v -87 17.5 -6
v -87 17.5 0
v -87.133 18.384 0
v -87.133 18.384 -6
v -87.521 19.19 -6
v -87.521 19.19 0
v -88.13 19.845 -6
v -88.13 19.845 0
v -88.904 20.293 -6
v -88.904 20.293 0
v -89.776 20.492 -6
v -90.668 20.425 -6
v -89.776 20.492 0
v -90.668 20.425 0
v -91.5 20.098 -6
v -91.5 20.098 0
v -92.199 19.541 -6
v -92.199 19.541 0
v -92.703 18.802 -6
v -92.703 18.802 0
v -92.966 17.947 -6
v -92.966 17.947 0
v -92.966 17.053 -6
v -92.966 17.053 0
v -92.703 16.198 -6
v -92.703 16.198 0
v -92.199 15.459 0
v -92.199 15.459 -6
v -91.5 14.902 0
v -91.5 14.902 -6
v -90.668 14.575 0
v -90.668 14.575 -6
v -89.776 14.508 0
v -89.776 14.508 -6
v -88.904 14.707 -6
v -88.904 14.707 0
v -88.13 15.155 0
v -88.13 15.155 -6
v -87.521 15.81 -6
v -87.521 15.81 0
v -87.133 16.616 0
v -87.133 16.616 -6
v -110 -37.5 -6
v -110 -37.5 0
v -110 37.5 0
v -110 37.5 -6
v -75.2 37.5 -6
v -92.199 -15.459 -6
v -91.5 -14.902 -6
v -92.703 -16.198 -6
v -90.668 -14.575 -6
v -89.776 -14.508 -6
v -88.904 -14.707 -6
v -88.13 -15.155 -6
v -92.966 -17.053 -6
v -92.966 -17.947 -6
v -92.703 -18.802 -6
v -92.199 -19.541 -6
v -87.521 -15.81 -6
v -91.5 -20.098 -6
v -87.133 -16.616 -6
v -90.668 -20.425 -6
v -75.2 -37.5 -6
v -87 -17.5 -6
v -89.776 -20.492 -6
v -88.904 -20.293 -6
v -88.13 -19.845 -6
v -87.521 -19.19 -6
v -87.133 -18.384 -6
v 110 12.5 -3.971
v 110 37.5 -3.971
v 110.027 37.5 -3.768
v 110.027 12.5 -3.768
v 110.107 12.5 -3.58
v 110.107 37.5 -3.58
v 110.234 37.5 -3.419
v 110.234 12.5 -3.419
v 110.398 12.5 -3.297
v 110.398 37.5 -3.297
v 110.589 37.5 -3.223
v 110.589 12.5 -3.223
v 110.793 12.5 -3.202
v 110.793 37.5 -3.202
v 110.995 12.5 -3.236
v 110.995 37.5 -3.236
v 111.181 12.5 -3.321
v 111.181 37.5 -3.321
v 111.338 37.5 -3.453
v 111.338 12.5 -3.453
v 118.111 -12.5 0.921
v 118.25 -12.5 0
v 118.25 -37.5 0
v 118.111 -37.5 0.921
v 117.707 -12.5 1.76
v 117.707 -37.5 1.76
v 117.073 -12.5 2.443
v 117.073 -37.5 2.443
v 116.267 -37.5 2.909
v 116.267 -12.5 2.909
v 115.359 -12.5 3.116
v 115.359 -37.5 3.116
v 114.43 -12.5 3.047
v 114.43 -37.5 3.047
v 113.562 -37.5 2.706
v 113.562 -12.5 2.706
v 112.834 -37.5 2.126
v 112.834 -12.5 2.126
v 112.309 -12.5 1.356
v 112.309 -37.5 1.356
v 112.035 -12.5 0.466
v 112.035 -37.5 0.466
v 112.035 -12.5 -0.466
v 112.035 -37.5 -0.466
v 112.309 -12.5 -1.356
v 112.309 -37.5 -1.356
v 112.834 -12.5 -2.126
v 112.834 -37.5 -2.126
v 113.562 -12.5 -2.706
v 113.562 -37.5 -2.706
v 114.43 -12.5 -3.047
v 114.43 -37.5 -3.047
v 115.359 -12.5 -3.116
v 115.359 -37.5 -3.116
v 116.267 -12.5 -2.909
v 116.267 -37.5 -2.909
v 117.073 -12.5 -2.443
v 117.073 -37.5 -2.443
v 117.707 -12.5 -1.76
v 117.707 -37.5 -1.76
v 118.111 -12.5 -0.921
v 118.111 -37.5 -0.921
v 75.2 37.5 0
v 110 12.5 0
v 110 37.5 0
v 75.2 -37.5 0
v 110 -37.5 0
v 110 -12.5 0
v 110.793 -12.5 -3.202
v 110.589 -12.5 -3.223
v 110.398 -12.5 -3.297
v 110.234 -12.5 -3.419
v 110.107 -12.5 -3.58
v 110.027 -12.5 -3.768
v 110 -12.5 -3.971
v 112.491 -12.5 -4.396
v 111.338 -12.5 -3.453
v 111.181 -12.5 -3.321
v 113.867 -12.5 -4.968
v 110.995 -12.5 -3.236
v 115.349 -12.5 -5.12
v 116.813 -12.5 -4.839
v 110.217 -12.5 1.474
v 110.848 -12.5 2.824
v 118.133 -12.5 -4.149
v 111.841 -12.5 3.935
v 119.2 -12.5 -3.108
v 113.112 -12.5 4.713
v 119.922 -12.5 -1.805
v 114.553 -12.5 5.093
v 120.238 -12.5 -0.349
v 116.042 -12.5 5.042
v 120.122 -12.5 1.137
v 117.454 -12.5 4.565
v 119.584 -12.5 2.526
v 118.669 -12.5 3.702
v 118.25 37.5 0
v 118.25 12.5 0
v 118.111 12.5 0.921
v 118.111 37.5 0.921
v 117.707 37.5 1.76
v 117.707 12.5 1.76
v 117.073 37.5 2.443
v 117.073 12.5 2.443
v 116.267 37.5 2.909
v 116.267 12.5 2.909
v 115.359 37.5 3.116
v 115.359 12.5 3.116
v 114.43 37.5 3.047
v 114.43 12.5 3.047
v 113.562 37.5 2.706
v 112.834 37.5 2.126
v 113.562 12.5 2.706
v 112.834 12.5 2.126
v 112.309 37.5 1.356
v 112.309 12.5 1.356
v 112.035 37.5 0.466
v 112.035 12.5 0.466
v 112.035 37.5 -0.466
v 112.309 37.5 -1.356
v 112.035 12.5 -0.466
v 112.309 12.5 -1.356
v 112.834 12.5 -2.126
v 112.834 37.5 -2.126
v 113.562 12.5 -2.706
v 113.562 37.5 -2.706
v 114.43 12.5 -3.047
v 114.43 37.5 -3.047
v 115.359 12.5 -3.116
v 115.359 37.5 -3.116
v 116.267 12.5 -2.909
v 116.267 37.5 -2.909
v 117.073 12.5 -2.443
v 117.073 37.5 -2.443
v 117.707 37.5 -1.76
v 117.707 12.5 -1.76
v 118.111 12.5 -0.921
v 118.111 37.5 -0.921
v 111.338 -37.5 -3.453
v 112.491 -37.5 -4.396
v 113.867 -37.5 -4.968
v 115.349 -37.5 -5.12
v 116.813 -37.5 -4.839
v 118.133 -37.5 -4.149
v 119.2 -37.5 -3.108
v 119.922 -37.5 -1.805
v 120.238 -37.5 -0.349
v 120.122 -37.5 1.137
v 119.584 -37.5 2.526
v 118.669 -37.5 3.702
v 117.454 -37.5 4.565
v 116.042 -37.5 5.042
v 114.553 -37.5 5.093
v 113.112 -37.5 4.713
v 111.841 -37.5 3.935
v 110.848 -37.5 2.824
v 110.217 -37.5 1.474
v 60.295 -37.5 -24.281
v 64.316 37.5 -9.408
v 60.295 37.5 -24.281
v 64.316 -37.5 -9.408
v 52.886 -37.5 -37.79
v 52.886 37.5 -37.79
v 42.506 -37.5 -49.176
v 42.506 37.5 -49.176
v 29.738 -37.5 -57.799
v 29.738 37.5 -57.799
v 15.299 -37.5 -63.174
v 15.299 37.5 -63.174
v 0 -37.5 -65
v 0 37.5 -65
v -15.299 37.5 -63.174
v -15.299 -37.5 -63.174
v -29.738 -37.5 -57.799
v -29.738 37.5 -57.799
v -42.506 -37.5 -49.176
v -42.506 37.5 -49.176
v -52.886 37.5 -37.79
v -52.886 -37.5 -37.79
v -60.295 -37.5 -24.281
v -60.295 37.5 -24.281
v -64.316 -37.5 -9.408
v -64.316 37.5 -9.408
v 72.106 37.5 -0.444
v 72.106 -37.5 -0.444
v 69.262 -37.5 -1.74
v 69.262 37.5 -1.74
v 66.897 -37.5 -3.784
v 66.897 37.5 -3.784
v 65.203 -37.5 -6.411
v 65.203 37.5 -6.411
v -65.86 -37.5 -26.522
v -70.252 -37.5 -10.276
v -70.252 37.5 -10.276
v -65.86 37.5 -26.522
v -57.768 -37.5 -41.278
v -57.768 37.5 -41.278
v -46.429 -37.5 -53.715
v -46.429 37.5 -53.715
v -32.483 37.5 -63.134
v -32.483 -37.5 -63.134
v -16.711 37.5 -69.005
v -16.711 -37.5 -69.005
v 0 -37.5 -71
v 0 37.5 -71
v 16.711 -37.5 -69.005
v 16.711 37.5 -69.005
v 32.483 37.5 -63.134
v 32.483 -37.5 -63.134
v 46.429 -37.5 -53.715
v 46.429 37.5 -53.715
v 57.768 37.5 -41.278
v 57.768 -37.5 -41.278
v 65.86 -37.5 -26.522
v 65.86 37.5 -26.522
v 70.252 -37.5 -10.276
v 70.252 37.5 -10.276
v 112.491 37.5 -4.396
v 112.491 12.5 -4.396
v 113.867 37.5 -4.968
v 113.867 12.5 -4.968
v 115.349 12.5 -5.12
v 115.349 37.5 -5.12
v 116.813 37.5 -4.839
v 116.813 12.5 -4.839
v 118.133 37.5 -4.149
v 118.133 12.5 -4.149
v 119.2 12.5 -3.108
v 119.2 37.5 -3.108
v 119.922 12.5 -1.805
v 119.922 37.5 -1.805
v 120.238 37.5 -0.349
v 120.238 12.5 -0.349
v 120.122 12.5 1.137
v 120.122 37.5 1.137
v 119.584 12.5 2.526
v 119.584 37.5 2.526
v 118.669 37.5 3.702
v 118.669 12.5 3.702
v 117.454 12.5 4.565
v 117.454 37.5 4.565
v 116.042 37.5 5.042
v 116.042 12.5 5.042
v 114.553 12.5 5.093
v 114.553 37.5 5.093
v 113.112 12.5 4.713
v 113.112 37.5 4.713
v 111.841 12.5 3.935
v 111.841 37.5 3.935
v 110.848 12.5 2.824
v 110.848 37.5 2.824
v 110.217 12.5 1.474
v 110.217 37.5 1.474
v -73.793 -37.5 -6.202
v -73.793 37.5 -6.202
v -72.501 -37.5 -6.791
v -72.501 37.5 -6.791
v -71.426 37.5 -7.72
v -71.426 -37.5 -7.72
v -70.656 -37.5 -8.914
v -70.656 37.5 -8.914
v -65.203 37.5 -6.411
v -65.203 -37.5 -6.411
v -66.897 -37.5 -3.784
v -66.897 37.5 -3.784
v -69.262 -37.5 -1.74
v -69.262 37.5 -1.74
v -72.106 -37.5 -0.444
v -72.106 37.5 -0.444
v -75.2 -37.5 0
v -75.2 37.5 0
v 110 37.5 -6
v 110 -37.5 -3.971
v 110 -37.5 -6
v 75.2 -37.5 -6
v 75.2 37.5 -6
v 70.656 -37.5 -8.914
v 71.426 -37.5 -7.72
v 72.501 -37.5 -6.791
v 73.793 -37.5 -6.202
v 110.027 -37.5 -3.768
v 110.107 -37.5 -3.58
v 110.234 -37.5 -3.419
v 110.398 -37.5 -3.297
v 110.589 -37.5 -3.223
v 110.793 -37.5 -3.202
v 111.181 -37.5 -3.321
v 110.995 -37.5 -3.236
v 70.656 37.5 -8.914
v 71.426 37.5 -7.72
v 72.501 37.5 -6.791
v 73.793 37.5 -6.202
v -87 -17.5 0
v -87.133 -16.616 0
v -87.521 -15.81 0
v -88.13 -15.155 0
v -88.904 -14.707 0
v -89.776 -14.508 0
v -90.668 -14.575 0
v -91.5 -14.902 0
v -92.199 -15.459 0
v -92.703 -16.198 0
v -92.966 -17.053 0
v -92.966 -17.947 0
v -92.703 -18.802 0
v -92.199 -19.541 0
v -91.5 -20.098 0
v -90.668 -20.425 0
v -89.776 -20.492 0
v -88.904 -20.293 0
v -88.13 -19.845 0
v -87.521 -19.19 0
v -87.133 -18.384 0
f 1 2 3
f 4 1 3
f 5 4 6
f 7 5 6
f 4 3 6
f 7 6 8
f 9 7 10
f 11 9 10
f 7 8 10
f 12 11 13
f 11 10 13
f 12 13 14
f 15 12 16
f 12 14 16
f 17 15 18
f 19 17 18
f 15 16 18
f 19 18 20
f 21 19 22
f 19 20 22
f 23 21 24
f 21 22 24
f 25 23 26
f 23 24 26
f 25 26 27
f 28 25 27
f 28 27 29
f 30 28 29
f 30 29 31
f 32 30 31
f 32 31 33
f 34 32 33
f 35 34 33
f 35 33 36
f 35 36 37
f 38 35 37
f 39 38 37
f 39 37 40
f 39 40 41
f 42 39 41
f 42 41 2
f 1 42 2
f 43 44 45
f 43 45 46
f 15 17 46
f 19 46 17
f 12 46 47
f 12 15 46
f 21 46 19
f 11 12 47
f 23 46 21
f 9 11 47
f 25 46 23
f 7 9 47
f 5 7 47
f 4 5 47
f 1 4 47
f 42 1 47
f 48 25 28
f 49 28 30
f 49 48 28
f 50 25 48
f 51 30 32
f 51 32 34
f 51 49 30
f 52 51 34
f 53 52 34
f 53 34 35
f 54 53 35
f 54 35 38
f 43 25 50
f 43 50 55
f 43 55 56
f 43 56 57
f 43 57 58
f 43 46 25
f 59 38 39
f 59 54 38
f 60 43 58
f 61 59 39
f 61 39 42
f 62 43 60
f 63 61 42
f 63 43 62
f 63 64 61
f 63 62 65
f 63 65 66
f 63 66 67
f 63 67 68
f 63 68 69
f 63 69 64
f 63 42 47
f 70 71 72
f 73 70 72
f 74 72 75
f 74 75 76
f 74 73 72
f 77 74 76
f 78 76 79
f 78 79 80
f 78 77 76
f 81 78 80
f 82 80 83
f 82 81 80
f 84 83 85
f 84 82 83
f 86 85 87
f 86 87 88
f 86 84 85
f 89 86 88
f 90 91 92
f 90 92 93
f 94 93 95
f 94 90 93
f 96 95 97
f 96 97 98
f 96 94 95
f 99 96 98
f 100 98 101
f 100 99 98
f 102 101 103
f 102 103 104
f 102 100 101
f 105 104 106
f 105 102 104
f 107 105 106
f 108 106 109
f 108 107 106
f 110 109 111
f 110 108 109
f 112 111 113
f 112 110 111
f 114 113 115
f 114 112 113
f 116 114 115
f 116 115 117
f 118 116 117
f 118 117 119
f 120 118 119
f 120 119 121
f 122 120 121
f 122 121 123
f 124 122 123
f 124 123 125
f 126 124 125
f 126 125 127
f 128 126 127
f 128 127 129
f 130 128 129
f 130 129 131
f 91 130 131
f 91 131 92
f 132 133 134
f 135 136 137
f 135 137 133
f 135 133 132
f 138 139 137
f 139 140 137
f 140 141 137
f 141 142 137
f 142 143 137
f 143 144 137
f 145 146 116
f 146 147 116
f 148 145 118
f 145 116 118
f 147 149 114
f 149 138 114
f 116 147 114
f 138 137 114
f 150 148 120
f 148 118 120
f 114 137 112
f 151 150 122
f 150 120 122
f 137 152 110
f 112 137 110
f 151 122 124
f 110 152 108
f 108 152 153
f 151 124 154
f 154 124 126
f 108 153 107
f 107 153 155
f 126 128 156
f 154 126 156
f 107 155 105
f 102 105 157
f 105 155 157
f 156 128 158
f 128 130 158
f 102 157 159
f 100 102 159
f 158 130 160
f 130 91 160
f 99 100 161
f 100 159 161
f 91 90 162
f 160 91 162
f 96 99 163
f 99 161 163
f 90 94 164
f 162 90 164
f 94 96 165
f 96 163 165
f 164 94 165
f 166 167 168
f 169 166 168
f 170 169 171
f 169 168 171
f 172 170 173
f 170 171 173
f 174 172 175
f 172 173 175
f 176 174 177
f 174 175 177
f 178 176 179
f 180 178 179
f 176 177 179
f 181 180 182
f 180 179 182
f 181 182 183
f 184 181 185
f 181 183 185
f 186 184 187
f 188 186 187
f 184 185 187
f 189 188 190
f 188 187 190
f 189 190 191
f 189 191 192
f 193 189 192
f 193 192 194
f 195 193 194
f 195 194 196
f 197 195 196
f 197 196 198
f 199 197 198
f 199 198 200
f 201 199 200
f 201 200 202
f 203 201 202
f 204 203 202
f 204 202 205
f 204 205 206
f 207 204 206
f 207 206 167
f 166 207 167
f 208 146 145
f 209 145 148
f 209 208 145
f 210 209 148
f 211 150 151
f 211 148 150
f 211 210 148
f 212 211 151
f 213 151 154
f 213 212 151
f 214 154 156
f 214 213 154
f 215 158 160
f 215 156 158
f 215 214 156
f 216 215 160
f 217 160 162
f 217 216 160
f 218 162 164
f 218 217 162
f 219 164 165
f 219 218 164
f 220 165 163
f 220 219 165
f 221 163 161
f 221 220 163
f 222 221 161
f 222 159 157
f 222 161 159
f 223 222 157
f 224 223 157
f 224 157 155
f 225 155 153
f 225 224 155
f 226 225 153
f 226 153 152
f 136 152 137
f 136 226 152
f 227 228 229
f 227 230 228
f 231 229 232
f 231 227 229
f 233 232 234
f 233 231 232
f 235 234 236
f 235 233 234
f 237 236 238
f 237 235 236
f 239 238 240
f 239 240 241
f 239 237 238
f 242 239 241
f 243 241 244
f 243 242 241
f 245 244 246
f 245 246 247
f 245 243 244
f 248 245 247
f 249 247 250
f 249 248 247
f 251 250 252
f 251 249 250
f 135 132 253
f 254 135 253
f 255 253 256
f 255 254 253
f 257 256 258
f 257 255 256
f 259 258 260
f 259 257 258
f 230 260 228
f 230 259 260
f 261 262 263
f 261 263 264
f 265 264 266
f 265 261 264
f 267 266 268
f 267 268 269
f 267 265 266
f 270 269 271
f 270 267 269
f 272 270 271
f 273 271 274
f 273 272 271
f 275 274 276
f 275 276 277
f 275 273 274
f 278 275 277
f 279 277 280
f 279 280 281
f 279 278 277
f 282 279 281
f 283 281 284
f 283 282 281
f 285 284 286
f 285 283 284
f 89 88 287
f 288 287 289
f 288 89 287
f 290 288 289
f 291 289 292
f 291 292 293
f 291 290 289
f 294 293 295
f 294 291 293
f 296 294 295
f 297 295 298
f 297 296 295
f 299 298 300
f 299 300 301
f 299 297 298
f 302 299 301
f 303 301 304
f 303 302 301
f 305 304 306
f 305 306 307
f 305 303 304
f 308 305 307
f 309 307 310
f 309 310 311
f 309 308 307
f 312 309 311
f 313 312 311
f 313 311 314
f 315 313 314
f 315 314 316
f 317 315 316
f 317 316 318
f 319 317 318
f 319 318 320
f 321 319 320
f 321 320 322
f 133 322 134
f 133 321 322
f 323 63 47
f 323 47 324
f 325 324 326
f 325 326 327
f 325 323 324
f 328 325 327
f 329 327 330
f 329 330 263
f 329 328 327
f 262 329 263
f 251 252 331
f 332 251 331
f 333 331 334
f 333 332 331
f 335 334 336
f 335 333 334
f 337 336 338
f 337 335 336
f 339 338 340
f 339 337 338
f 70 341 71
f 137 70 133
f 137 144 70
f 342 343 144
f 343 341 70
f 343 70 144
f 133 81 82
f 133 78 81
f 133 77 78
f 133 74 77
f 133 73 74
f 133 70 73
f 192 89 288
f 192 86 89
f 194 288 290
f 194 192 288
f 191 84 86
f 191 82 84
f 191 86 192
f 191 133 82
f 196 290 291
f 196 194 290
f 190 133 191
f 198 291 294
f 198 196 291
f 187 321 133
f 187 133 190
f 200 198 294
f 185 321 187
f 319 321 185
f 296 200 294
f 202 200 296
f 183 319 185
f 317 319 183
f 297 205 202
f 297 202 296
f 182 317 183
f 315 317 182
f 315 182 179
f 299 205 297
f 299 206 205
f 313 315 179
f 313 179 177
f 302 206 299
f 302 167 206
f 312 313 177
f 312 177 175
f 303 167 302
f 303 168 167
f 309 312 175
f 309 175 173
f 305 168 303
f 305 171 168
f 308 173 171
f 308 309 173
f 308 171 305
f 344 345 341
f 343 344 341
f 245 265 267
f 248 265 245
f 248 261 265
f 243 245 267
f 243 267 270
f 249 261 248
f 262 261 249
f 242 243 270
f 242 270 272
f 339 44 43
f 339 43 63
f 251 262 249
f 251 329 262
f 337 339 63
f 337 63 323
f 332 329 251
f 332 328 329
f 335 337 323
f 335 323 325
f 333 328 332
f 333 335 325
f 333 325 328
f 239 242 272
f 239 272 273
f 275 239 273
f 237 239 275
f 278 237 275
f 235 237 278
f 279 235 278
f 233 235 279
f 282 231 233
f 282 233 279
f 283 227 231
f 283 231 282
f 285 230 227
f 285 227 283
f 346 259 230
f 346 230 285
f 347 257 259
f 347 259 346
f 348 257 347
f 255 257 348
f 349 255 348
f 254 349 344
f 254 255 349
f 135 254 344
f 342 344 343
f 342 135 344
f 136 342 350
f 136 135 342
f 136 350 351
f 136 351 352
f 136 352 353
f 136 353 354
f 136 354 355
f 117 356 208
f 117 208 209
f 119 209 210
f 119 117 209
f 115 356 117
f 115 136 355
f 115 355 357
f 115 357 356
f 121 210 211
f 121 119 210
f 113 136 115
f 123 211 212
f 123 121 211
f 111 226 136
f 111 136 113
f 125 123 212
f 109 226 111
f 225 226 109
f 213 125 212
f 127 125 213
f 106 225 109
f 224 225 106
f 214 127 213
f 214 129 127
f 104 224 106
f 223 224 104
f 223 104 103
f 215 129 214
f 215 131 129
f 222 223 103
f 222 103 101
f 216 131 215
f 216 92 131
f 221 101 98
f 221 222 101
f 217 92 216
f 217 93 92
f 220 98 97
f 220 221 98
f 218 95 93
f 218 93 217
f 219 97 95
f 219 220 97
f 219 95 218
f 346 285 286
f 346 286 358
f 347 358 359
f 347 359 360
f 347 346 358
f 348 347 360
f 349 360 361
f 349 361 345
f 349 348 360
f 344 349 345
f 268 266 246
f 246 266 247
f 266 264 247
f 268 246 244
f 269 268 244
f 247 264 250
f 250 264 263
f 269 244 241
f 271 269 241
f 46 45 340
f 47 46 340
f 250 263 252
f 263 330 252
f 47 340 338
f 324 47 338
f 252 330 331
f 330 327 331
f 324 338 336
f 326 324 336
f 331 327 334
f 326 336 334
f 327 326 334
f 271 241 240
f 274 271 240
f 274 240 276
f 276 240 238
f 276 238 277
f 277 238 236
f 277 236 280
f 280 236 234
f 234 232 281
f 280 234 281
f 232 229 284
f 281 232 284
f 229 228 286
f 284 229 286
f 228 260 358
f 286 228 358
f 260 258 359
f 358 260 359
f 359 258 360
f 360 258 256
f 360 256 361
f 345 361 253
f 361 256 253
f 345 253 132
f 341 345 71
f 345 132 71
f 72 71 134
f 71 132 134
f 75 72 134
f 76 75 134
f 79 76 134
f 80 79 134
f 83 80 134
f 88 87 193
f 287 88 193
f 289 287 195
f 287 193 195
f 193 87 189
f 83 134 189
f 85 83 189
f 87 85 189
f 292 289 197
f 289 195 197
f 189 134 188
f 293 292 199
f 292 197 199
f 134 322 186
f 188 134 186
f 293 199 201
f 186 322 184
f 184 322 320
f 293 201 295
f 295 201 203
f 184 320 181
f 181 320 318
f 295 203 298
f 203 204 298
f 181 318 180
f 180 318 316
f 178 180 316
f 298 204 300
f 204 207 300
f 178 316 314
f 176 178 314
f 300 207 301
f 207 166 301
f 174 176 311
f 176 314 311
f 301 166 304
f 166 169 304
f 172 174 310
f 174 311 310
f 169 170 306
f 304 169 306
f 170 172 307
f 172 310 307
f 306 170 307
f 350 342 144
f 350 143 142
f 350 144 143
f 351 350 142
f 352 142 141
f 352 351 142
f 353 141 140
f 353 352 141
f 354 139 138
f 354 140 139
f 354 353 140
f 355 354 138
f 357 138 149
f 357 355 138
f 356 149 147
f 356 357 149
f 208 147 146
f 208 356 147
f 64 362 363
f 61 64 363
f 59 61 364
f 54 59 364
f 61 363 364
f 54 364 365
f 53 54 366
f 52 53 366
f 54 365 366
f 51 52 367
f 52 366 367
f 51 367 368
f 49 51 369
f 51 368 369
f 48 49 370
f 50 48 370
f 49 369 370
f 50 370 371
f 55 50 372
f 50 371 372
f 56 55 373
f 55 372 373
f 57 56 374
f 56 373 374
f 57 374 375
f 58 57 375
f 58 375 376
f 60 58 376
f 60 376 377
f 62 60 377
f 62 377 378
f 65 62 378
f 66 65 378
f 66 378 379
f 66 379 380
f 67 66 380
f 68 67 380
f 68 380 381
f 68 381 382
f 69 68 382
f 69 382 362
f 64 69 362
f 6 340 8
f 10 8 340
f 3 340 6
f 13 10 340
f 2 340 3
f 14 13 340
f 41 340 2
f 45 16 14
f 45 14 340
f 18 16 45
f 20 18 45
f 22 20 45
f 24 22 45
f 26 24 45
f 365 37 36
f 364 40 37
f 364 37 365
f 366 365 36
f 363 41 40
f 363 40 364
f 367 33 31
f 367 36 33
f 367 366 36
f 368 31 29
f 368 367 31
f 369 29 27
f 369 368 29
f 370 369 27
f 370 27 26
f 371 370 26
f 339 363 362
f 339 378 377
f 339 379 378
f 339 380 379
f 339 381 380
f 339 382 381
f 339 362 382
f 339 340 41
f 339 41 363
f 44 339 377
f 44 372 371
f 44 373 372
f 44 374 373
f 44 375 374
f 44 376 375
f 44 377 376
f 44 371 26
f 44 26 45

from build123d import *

# Parameters (mm, degrees)
F1_DEPTH      = 37.5
F3_R          = 3.125
F4_DEPTH      = 37.5
F4_DEPTH_BACK = 37.5
F5_W          = 12.7266719937
F5_H          = 25
F6_DEPTH      = 71.001
F6_DEPTH_BACK = 5.126
F2_R          = 3
F7_DEPTH      = 71.001


with BuildPart() as f1:
    # F0 (on Front) → F1 (new body, symmetric)
    with BuildSketch(Plane.XZ):
        with BuildLine():
            ThreePointArc((64.3155620097, -9.4078947368), (0, -65), (-64.3155620097, -9.4078947368))
            ThreePointArc((-64.3155620097, -9.4078947368), (-68.0064440401, -2.6779462302), (-75.1997340421, 0))
            Line((-75.1997340421, 0), (-110, 0))
            Line((-110, 0), (-110, -6))
            Line((-110, -6), (-75.1997340421, -6))
            ThreePointArc((-75.1997340421, -6), (-71.9300567685, -7.2172482865), (-70.2523831183, -10.2763157895))
            ThreePointArc((-70.2523831183, -10.2763157895), (0, -71), (70.2523831183, -10.2763157895))
            ThreePointArc((70.2523831183, -10.2763157895), (71.9300567685, -7.2172482865), (75.1997340421, -6))
            Line((75.1997340421, -6), (110, -6))
            Line((110, -6), (110, 0))
            Line((110, 0), (75.1997340421, 0))
            ThreePointArc((75.1997340421, 0), (68.0064440401, -2.6779462302), (64.3155620097, -9.4078947368))
        make_face()
    extrude(amount=F1_DEPTH, both=True)

    # F3 (on Front) → F4 (join, two sides)
    with BuildSketch(Plane.XZ) as f4_sk:
        with BuildLine():
            ThreePointArc((110, -3.971), (110.4913325801, -3.253734436), (111.3376547749, -3.4527729648))
            ThreePointArc((111.3376547749, -3.4527729648), (119.9038999403, 1.851415772), (110, 0))
            Line((110, 0), (110, -3.971))
        make_face()
        with Locations((115.125, 0)):
            Circle(F3_R, mode=Mode.SUBTRACT)
    extrude(amount=F4_DEPTH)
    extrude(f4_sk.sketch, amount=-F4_DEPTH_BACK)

    # F5 (on Top) → F6 (cut, two sides)
    with BuildSketch(Plane.XY) as f6_sk:
        with Locations((116.3633359969, 0)):
            Rectangle(F5_W, F5_H)
    extrude(amount=-F6_DEPTH, mode=Mode.SUBTRACT)
    extrude(f6_sk.sketch, amount=F6_DEPTH_BACK, mode=Mode.SUBTRACT)

    # F2 (on face) → F7 (cut, through all)
    with BuildSketch(Plane.XY):
        with Locations((-90, 17.5)):
            Circle(F2_R)
        with Locations((-90, -17.5)):
            Circle(F2_R)
    extrude(amount=-F7_DEPTH, mode=Mode.SUBTRACT)


solid = f1.part
